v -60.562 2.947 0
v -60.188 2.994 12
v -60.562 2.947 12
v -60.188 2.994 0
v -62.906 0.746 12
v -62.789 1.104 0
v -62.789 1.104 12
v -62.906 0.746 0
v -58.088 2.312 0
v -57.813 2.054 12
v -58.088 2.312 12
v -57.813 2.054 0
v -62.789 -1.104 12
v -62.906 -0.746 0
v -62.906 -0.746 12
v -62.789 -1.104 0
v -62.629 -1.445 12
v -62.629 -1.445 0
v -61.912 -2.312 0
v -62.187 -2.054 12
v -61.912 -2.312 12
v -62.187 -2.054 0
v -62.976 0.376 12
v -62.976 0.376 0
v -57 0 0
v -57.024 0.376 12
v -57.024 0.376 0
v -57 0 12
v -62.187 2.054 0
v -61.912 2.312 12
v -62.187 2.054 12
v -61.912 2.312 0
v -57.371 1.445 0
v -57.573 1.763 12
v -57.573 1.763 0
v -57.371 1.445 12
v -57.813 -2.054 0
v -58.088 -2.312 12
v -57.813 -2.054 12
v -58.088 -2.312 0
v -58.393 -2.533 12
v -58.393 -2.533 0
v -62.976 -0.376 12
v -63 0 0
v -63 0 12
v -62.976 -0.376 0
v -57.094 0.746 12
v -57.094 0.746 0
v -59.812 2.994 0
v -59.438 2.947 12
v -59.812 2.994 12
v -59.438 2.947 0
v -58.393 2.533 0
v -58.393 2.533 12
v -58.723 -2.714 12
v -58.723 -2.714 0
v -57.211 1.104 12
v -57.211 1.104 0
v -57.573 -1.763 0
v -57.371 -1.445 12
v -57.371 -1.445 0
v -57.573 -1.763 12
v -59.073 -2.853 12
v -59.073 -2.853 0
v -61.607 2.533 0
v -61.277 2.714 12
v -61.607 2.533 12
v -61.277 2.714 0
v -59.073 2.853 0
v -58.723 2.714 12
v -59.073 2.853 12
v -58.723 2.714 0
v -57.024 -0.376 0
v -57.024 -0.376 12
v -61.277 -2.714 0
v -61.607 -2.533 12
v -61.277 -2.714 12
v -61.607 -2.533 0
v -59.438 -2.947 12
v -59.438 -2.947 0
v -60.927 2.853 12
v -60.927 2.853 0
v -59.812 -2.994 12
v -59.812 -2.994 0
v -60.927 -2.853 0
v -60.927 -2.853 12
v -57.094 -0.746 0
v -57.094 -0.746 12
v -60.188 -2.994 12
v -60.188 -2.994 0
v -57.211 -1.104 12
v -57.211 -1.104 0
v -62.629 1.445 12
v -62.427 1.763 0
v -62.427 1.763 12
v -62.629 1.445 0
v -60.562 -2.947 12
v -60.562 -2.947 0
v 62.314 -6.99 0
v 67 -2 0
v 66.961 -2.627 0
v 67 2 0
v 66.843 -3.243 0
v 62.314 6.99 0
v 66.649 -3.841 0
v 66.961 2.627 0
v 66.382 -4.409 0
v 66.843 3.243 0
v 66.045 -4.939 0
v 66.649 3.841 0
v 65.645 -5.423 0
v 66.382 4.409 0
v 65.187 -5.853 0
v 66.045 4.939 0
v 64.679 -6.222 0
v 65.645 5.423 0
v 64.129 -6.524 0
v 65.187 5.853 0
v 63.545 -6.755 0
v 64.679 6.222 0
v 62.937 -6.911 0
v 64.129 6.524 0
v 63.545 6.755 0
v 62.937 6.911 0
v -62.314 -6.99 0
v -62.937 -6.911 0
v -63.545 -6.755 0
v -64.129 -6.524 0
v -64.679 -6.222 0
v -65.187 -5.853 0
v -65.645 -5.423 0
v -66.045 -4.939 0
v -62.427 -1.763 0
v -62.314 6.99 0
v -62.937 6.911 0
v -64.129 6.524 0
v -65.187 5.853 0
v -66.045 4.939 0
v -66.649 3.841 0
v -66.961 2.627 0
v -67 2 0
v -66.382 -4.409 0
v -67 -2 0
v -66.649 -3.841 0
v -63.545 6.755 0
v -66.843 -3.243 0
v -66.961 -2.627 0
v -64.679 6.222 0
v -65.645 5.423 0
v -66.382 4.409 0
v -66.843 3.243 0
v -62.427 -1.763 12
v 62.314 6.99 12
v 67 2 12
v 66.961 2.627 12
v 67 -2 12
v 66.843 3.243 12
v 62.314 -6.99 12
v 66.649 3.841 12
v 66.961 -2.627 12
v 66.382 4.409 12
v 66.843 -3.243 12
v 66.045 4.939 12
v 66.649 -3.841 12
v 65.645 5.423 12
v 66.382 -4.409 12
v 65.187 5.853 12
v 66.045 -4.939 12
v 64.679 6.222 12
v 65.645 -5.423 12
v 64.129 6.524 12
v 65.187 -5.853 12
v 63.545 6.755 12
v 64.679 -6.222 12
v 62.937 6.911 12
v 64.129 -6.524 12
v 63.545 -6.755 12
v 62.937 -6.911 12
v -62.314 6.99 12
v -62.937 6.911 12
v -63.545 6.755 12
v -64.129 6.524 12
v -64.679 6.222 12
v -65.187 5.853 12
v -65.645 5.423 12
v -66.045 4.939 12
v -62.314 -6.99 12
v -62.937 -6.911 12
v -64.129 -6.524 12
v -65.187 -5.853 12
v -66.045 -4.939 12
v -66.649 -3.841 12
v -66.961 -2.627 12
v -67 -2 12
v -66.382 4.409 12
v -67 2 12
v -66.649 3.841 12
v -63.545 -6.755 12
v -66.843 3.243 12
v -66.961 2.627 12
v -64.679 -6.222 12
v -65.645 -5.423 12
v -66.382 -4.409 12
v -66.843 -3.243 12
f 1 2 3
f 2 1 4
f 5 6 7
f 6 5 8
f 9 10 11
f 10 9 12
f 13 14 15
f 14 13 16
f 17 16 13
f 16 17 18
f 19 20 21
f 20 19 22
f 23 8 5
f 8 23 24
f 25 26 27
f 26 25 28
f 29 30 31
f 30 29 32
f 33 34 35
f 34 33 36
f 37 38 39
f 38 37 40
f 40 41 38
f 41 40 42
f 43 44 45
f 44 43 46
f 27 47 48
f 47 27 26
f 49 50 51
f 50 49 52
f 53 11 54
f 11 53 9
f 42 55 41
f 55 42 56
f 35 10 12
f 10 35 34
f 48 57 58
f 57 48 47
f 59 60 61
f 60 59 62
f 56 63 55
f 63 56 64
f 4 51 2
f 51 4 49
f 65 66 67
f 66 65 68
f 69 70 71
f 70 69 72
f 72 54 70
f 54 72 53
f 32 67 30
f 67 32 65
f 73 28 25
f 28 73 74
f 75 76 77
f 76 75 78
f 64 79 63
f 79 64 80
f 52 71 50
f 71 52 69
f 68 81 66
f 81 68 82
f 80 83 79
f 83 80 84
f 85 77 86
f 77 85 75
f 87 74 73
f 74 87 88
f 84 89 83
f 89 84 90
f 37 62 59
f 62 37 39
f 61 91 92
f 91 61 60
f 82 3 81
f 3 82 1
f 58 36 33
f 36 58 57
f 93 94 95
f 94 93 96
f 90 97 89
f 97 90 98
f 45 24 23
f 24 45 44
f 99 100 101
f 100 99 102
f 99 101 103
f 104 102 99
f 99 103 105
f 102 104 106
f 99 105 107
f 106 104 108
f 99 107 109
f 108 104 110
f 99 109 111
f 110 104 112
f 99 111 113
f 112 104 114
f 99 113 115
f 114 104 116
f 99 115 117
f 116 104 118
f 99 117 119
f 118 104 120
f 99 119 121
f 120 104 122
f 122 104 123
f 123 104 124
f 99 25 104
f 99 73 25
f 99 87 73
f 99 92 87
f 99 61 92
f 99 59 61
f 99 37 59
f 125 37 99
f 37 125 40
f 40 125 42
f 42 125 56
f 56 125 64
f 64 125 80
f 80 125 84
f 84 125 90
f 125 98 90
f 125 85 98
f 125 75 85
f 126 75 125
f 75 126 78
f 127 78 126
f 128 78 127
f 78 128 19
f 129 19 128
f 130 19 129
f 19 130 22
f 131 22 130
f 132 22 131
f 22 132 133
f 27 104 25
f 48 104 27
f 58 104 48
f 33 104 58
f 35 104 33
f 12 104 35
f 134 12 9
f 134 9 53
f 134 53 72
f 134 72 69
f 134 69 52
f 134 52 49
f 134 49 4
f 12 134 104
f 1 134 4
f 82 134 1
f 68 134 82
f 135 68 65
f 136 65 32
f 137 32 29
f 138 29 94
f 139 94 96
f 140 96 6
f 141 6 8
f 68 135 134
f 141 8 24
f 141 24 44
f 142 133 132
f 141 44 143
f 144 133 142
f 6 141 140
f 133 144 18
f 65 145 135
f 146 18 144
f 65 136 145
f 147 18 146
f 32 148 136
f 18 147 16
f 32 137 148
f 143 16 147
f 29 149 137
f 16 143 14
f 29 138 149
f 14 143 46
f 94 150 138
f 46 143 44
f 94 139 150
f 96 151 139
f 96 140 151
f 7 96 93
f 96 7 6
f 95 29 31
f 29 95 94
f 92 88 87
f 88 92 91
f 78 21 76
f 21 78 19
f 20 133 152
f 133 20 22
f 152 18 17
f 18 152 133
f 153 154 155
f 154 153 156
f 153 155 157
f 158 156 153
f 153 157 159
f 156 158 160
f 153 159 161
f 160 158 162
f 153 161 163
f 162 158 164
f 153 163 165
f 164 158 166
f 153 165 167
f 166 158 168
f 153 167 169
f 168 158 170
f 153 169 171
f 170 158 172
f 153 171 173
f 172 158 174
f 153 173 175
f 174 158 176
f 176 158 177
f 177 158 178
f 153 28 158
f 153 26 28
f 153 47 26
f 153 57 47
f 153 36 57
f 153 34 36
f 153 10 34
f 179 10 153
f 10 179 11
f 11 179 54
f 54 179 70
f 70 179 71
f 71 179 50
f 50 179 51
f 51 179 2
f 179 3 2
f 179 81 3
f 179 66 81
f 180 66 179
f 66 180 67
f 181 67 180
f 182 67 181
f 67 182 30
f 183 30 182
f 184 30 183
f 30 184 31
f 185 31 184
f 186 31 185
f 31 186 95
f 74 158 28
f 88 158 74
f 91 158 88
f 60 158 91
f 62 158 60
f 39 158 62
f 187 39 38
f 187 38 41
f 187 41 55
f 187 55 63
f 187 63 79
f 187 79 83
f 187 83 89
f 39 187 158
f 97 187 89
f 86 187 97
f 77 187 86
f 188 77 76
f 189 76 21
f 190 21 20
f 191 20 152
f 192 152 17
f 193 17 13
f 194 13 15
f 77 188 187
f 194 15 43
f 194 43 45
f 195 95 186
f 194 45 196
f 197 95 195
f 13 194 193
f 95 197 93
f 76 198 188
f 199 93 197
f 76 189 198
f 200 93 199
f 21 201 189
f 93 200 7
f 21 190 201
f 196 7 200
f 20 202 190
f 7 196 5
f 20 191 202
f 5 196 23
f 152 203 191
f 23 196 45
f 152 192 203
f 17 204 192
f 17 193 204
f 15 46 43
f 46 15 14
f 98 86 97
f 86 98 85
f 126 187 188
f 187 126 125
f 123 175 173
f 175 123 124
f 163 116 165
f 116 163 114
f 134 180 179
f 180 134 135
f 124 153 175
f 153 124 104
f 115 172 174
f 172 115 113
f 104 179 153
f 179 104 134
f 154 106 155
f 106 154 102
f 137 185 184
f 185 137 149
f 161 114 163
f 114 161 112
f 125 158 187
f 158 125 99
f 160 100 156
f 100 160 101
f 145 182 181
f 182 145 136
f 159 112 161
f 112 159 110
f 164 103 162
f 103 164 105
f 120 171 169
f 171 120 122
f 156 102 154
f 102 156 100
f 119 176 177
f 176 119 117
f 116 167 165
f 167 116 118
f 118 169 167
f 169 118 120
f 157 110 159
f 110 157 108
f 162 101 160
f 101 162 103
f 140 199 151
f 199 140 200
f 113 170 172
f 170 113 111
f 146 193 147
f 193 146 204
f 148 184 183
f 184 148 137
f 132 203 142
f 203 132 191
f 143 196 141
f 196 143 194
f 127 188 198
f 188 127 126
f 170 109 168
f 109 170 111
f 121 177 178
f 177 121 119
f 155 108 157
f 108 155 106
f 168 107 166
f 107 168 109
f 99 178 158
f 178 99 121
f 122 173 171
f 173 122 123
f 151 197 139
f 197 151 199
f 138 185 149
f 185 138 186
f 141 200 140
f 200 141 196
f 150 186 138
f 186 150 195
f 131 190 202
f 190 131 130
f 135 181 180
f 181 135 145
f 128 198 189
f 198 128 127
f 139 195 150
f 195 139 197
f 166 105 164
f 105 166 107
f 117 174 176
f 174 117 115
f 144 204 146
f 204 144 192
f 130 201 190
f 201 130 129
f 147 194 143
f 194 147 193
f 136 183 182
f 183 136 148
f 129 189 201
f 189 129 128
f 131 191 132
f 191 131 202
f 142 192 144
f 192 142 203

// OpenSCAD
$fn = 50;


difference() {
	union() {
		hull() {
			translate(v = [-62.0000000000, 2.0000000000, 0]) {
				cylinder(h = 12, r = 5);
			}
			translate(v = [62.0000000000, 2.0000000000, 0]) {
				cylinder(h = 12, r = 5);
			}
			translate(v = [-62.0000000000, -2.0000000000, 0]) {
				cylinder(h = 12, r = 5);
			}
			translate(v = [62.0000000000, -2.0000000000, 0]) {
				cylinder(h = 12, r = 5);
			}
		}
	}
	union() {
		translate(v = [-60.0000000000, 0.0000000000, 0]) {
			cylinder(h = 12, r = 3.0000000000);
		}
		translate(v = [-60.0000000000, 0.0000000000, 0]) {
			cylinder(h = 12, r = 1.5000000000);
		}
		translate(v = [-60.0000000000, 0.0000000000, 0]) {
			cylinder(h = 12, r = 1.5000000000);
		}
		translate(v = [-60.0000000000, 0.0000000000, 0]) {
			cylinder(h = 12, r = 1.5000000000);
		}
	}
}
